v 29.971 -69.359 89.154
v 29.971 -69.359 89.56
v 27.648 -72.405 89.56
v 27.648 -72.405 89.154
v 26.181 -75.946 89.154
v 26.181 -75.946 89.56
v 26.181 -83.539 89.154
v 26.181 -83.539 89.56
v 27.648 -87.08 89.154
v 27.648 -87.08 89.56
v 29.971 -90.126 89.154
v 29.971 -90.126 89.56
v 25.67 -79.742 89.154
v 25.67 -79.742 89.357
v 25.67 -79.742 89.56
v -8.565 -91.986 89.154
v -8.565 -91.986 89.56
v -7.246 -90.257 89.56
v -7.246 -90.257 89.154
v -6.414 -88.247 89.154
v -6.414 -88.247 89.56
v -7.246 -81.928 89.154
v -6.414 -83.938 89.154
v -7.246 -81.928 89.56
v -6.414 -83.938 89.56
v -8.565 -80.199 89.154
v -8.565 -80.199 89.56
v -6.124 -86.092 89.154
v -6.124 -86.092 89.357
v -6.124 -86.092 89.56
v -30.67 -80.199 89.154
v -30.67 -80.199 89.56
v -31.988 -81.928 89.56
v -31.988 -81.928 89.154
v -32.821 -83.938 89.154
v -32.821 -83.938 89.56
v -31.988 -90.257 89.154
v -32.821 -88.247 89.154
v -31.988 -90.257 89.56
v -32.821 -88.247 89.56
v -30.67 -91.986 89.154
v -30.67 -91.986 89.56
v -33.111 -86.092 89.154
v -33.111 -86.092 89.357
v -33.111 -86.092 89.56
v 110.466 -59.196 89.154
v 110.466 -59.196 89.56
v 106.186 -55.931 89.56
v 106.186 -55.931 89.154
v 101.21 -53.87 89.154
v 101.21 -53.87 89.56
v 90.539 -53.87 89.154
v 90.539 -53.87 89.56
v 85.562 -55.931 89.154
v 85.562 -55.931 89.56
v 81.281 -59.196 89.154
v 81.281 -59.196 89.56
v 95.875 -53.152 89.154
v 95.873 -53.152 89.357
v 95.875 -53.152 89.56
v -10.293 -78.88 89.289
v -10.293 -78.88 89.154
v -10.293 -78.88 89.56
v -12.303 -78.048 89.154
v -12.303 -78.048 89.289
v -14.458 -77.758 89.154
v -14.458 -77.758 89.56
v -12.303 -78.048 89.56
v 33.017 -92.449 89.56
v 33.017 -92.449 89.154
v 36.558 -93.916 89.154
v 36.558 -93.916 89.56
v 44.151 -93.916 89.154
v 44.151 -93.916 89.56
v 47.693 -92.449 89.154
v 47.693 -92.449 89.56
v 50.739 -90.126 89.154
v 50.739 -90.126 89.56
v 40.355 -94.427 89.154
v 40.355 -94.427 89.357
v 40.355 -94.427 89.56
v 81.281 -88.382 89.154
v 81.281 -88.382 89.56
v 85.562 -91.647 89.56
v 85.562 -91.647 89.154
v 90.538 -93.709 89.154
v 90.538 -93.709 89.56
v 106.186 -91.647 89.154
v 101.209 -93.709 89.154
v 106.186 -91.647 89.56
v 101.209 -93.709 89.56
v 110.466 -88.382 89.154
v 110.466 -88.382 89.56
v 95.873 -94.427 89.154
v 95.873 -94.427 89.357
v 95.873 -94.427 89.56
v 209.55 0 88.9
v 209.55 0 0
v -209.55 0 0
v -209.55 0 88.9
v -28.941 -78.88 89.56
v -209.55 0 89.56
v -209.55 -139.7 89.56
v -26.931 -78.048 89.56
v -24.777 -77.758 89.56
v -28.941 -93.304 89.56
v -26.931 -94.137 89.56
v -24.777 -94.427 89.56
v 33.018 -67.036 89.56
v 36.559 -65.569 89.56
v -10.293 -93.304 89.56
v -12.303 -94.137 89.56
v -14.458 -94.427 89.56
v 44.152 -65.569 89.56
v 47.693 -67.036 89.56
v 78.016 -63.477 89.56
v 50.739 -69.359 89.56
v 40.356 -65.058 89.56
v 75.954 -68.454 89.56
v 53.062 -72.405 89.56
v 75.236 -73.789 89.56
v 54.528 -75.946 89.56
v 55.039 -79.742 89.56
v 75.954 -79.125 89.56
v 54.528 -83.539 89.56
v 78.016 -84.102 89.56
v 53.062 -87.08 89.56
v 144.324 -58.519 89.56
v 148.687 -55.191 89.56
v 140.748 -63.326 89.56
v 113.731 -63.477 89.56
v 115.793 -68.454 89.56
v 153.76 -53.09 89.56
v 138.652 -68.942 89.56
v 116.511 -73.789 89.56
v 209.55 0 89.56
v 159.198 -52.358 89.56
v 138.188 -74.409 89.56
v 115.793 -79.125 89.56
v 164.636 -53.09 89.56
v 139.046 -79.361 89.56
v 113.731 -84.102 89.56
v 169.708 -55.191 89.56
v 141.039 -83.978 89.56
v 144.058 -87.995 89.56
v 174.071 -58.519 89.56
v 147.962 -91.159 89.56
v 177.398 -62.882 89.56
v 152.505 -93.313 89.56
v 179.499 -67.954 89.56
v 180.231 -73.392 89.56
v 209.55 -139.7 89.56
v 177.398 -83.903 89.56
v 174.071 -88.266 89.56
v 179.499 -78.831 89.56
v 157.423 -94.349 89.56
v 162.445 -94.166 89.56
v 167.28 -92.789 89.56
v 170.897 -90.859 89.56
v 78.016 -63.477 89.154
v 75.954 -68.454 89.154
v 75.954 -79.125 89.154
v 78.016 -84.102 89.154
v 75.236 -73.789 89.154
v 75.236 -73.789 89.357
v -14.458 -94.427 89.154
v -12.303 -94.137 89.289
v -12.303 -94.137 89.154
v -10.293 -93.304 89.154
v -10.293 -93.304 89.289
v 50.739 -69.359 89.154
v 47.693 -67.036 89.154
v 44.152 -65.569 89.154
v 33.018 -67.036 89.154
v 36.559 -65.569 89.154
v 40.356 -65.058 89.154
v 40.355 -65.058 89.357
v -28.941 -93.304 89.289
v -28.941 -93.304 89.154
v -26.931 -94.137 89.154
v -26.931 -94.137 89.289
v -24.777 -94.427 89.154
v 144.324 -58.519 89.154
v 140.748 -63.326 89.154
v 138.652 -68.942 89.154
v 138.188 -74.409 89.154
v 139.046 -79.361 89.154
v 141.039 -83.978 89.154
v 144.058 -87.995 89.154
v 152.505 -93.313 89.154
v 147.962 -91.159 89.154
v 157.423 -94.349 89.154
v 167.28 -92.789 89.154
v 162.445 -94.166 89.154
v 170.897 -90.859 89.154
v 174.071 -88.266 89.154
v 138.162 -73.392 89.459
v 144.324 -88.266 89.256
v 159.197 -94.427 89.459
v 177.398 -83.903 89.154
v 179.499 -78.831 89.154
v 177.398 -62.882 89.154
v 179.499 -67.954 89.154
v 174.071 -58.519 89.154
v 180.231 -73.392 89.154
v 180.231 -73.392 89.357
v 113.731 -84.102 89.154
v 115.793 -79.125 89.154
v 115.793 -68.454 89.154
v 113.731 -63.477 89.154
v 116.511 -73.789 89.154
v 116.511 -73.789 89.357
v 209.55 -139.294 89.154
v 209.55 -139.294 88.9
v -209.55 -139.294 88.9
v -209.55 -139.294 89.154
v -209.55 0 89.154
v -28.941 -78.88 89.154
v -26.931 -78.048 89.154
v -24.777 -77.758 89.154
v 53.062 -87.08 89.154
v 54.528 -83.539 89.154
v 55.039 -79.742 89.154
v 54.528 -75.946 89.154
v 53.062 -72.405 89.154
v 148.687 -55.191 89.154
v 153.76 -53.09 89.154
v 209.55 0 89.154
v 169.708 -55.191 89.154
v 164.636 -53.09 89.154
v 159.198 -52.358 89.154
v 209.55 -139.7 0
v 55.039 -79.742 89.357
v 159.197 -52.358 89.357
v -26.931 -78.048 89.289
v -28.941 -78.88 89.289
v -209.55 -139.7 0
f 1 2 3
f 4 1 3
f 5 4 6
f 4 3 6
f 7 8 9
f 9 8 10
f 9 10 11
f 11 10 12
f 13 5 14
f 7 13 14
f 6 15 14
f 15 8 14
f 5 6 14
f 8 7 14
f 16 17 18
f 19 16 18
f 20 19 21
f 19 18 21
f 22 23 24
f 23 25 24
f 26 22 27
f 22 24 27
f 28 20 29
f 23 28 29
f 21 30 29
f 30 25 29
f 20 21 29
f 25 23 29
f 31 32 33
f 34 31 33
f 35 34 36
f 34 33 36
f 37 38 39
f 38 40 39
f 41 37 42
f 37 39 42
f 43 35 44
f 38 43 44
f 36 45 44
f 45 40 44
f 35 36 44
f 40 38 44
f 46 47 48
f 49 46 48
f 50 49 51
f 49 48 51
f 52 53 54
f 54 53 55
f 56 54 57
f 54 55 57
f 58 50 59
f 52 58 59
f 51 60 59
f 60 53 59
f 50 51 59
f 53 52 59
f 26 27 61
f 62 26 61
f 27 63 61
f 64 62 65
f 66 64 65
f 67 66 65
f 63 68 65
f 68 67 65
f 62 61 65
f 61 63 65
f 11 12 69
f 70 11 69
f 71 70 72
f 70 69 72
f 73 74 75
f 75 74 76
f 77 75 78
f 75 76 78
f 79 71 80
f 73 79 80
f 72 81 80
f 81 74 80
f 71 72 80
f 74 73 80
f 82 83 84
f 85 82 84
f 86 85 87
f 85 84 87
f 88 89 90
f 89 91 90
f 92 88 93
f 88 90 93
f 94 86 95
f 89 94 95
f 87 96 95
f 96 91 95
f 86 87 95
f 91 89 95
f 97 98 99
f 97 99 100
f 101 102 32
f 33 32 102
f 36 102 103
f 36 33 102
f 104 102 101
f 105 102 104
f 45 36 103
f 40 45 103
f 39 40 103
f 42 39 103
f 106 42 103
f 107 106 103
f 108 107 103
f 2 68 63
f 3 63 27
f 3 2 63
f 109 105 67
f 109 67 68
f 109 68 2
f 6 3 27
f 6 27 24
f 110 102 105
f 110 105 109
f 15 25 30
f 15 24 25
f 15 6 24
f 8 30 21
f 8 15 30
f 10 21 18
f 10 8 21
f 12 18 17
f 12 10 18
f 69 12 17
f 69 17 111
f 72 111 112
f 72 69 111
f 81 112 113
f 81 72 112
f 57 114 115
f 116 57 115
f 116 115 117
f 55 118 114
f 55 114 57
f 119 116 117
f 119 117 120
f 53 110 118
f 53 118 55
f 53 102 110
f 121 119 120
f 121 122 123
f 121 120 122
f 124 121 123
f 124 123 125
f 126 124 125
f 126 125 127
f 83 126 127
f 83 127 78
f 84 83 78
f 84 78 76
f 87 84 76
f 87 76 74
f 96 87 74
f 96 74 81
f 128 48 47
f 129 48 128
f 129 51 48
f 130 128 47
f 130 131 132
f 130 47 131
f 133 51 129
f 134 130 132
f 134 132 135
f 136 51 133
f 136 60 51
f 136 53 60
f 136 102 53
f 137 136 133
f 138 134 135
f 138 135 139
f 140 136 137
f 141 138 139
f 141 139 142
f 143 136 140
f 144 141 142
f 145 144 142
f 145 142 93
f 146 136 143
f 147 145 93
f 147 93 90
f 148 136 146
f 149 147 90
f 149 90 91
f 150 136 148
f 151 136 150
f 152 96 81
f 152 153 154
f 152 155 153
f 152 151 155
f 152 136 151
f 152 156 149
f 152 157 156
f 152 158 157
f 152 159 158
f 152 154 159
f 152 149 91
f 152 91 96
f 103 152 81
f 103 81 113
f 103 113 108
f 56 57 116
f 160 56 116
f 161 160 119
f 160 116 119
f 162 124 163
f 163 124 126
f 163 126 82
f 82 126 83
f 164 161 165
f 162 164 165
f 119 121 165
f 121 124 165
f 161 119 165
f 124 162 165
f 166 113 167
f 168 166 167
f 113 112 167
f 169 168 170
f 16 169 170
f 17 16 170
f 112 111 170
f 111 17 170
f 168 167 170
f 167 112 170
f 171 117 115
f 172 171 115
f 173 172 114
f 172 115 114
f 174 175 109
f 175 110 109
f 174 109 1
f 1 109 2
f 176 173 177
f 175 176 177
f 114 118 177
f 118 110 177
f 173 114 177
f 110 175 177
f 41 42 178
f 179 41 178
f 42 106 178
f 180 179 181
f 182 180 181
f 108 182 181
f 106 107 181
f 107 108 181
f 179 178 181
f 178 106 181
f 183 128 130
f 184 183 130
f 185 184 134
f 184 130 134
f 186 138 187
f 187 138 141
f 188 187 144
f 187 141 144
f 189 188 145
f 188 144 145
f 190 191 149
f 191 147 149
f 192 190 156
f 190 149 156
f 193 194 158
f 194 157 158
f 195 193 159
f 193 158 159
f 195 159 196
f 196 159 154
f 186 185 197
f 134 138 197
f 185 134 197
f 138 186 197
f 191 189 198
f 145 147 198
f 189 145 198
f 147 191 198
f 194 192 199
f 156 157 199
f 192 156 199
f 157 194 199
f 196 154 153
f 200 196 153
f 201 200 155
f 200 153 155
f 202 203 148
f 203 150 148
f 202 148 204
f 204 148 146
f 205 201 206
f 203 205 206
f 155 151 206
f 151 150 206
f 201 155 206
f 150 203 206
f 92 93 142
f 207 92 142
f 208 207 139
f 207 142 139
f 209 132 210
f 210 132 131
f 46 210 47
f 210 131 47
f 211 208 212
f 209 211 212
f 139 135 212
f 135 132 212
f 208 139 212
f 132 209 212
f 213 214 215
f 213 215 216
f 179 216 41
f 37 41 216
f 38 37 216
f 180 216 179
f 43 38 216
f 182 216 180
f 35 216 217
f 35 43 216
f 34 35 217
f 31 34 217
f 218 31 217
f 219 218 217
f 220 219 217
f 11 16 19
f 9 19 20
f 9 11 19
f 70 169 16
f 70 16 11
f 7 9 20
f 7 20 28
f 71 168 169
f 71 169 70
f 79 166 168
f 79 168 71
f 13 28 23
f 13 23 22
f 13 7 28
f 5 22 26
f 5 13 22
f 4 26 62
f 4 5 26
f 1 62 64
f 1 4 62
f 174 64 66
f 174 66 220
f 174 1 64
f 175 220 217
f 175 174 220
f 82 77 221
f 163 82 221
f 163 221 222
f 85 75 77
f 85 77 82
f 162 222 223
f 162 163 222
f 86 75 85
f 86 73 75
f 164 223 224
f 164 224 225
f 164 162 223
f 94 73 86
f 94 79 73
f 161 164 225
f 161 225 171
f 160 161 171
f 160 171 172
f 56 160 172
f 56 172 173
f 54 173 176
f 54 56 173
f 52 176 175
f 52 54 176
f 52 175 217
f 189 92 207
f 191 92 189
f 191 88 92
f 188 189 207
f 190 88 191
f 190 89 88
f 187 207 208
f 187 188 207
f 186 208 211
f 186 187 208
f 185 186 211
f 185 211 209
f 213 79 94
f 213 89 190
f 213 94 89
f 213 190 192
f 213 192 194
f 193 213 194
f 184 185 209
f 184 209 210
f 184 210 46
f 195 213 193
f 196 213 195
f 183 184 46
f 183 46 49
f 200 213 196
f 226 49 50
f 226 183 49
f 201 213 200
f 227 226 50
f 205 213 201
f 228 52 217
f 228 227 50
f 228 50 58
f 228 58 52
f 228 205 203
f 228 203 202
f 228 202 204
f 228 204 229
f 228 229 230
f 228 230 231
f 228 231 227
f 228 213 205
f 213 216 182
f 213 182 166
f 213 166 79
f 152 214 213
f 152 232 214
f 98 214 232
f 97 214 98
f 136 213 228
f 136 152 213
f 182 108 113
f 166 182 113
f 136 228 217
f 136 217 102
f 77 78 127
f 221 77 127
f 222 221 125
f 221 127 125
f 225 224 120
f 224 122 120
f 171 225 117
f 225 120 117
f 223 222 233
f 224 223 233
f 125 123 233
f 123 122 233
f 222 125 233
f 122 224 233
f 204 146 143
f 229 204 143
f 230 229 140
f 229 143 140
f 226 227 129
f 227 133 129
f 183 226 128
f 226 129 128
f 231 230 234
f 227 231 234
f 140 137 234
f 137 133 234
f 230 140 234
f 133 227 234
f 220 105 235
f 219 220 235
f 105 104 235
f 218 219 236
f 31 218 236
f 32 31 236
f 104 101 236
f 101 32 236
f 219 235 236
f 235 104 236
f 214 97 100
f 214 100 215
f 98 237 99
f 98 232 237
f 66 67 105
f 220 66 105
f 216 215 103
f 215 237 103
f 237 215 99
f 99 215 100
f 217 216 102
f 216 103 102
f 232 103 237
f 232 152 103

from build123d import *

# Parameters (mm, degrees)
F1_DEPTH = 209.55
F3_DEPTH = 0.4064


# Not quite as in the source:
# - the dataset's text gives a spline's control points without its knots; the knots are read off the source's solid


with BuildPart() as f1:
    # F0 (on Right) → F1 (new body, symmetric)
    with BuildSketch(Plane.YZ):
        Polygon((-139.7, 0), (0, 0), (0, 88.9), (-139.2936, 88.9), (-139.2936, 89.154), (0, 89.154), (0, 89.5604), (-139.7, 89.5604), align=None)
    extrude(amount=F1_DEPTH, both=True)

    # F2 (on face) → F3 (cut, through all)
    with BuildSketch(Plane.XY.offset(89.5604)):
        with BuildLine():
            add(Edge.make_bspline(
                [(-30.6699001032, -91.9856678392), (-29.1271803032, -93.5287178392), (-26.9585029032, -94.4268618392), (-24.7768207032, -94.4268618392)],
                knots=[3, 3, 3, 3, 4, 4, 4, 4], degree=3))
            Line((-24.7768207032, -94.4268618392), (-14.4580707032, -94.4268618392))
            add(Edge.make_bspline(
                [(-14.4580707032, -94.4268618392), (-12.2754995032, -94.4268618392), (-10.1075587032, -93.5287178392), (-8.5648643032, -91.9856678392)],
                knots=[0, 0, 0, 0, 1, 1, 1, 1], degree=3))
            add(Edge.make_bspline(
                [(-8.5648643032, -91.9856678392), (-7.0217127032, -90.4429226392), (-6.1236703032, -88.2745754392), (-6.1236703032, -86.0924868392), (-6.1236703032, -83.9103220392), (-7.0217127032, -81.7420256392), (-8.5648643032, -80.1989248392)],
                knots=[1, 1, 1, 1, 2, 2, 2, 3, 3, 3, 3], degree=3))
            add(Edge.make_bspline(
                [(-8.5648643032, -80.1989248392), (-10.1075587032, -78.6562304392), (-12.2754995032, -77.7581118392), (-14.4580707032, -77.7581118392)],
                knots=[3, 3, 3, 3, 4, 4, 4, 4], degree=3))
            Line((-14.4580707032, -77.7581118392), (-24.7768207032, -77.7581118392))
            add(Edge.make_bspline(
                [(-24.7768207032, -77.7581118392), (-26.9585029032, -77.7581118392), (-29.1271803032, -78.6562304392), (-30.6699001032, -80.1989248392)],
                knots=[0, 0, 0, 0, 1, 1, 1, 1], degree=3))
            add(Edge.make_bspline(
                [(-30.6699001032, -80.1989248392), (-32.2126199032, -81.7420256392), (-33.1111957032, -83.9103220392), (-33.1111957032, -86.0924868392), (-33.1111957032, -88.2745754392), (-32.2126199032, -90.4429226392), (-30.6699001032, -91.9856678392)],
                knots=[1, 1, 1, 1, 2, 2, 2, 3, 3, 3, 3], degree=3))
        make_face()
        with BuildLine():
            add(Edge.make_bspline(
                [(50.7387254968, -69.3589668392), (48.0202142968, -66.6407604392), (44.1992668968, -65.0581118392), (40.3547990968, -65.0581118392)],
                knots=[7, 7, 7, 7, 8, 8, 8, 8], degree=3))
            add(Edge.make_bspline(
                [(40.3547990968, -65.0581118392), (36.5108392968, -65.0581118392), (32.6898918968, -66.6407604392), (29.9713806968, -69.3589668392)],
                knots=[0, 0, 0, 0, 1, 1, 1, 1], degree=3))
            add(Edge.make_bspline(
                [(29.9713806968, -69.3589668392), (27.2531742968, -72.0774526392), (25.6704240968, -75.8984254392), (25.6704240968, -79.7424868392), (25.6704240968, -83.5868276392), (27.2531742968, -87.4076226392), (29.9713806968, -90.1256512392)],
                knots=[1, 1, 1, 1, 2, 2, 2, 3, 3, 3, 3], degree=3))
            add(Edge.make_bspline(
                [(29.9713806968, -90.1256512392), (32.6898918968, -92.8441878392), (36.5108392968, -94.4268618392), (40.3547990968, -94.4268618392), (44.1992668968, -94.4268618392), (48.0202142968, -92.8441878392), (50.7387254968, -90.1256512392)],
                knots=[3, 3, 3, 3, 4, 4, 4, 5, 5, 5, 5], degree=3))
            add(Edge.make_bspline(
                [(50.7387254968, -90.1256512392), (53.4569318968, -87.4076226392), (55.0391740968, -83.5868276392), (55.0391740968, -79.7424868392), (55.0391740968, -75.8984254392), (53.4569318968, -72.0774526392), (50.7387254968, -69.3589668392)],
                knots=[5, 5, 5, 5, 6, 6, 6, 7, 7, 7, 7], degree=3))
        make_face()
        with BuildLine():
            add(Edge.make_bspline(
                [(110.4663682968, -59.1962744392), (106.6457510968, -55.3760128392), (101.2762418968, -53.1516840392), (95.8732046968, -53.1516840392)],
                knots=[7, 7, 7, 7, 8, 8, 8, 8], degree=3))
            add(Edge.make_bspline(
                [(95.8732046968, -53.1516840392), (90.4710310968, -53.1516840392), (85.1011662968, -55.3760128392), (81.2809046968, -59.1962744392)],
                knots=[0, 0, 0, 0, 1, 1, 1, 1], degree=3))
            add(Edge.make_bspline(
                [(81.2809046968, -59.1962744392), (77.4602620968, -63.0168662392), (75.2357046968, -68.3864262392), (75.2357046968, -73.7891840392), (75.2357046968, -79.1919418392), (77.4602620968, -84.5619844392), (81.2809046968, -88.3822460392)],
                knots=[1, 1, 1, 1, 2, 2, 2, 3, 3, 3, 3], degree=3))
            add(Edge.make_bspline(
                [(81.2809046968, -88.3822460392), (85.1011662968, -92.2026854392), (90.4710310968, -94.4266840392), (95.8732046968, -94.4266840392), (101.2762418968, -94.4266840392), (106.6457510968, -92.2026854392), (110.4663682968, -88.3822460392)],
                knots=[3, 3, 3, 3, 4, 4, 4, 5, 5, 5, 5], degree=3))
            add(Edge.make_bspline(
                [(110.4663682968, -88.3822460392), (114.2866298968, -84.5619844392), (116.5107046968, -79.1919418392), (116.5107046968, -73.7891840392), (116.5107046968, -68.3864262392), (114.2866298968, -63.0168662392), (110.4663682968, -59.1962744392)],
                knots=[5, 5, 5, 5, 6, 6, 6, 7, 7, 7, 7], degree=3))
        make_face()
        with BuildLine():
            add(Edge.make_bspline(
                [(174.0707622968, -58.5189326392), (170.1766628968, -54.6249856392), (164.7038772968, -52.3579340392), (159.1969032968, -52.3579340392)],
                knots=[7, 7, 7, 7, 8, 8, 8, 8], degree=3))
            add(Edge.make_bspline(
                [(159.1969032968, -52.3579340392), (153.6906150968, -52.3579340392), (148.2173722968, -54.6249856392), (144.3237300968, -58.5189326392)],
                knots=[0, 0, 0, 0, 1, 1, 1, 1], degree=3))
            add(Edge.make_bspline(
                [(144.3237300968, -58.5189326392), (140.4297322968, -62.4129304392), (138.1624266968, -67.8854620392), (138.1624266968, -73.3923090392), (138.1624266968, -78.8991306392), (140.4297322968, -84.3721448392), (144.3237300968, -88.2661426392), (148.2173722968, -92.1597848392), (153.6906150968, -94.4266840392), (159.1969032968, -94.4266840392), (164.7038772968, -94.4266840392), (170.1766628968, -92.1597848392), (174.0707622968, -88.2661426392)],
                knots=[1, 1, 1, 1, 2, 2, 2, 3, 3, 3, 4, 4, 4, 5, 5, 5, 5], degree=3))
            add(Edge.make_bspline(
                [(174.0707622968, -88.2661426392), (177.9644044968, -84.3721448392), (180.2312782968, -78.8991306392), (180.2312782968, -73.3923090392), (180.2312782968, -67.8854620392), (177.9644044968, -62.4129304392), (174.0707622968, -58.5189326392)],
                knots=[5, 5, 5, 5, 6, 6, 6, 7, 7, 7, 7], degree=3))
        make_face()
    extrude(amount=-F3_DEPTH, mode=Mode.SUBTRACT)


solid = f1.part
